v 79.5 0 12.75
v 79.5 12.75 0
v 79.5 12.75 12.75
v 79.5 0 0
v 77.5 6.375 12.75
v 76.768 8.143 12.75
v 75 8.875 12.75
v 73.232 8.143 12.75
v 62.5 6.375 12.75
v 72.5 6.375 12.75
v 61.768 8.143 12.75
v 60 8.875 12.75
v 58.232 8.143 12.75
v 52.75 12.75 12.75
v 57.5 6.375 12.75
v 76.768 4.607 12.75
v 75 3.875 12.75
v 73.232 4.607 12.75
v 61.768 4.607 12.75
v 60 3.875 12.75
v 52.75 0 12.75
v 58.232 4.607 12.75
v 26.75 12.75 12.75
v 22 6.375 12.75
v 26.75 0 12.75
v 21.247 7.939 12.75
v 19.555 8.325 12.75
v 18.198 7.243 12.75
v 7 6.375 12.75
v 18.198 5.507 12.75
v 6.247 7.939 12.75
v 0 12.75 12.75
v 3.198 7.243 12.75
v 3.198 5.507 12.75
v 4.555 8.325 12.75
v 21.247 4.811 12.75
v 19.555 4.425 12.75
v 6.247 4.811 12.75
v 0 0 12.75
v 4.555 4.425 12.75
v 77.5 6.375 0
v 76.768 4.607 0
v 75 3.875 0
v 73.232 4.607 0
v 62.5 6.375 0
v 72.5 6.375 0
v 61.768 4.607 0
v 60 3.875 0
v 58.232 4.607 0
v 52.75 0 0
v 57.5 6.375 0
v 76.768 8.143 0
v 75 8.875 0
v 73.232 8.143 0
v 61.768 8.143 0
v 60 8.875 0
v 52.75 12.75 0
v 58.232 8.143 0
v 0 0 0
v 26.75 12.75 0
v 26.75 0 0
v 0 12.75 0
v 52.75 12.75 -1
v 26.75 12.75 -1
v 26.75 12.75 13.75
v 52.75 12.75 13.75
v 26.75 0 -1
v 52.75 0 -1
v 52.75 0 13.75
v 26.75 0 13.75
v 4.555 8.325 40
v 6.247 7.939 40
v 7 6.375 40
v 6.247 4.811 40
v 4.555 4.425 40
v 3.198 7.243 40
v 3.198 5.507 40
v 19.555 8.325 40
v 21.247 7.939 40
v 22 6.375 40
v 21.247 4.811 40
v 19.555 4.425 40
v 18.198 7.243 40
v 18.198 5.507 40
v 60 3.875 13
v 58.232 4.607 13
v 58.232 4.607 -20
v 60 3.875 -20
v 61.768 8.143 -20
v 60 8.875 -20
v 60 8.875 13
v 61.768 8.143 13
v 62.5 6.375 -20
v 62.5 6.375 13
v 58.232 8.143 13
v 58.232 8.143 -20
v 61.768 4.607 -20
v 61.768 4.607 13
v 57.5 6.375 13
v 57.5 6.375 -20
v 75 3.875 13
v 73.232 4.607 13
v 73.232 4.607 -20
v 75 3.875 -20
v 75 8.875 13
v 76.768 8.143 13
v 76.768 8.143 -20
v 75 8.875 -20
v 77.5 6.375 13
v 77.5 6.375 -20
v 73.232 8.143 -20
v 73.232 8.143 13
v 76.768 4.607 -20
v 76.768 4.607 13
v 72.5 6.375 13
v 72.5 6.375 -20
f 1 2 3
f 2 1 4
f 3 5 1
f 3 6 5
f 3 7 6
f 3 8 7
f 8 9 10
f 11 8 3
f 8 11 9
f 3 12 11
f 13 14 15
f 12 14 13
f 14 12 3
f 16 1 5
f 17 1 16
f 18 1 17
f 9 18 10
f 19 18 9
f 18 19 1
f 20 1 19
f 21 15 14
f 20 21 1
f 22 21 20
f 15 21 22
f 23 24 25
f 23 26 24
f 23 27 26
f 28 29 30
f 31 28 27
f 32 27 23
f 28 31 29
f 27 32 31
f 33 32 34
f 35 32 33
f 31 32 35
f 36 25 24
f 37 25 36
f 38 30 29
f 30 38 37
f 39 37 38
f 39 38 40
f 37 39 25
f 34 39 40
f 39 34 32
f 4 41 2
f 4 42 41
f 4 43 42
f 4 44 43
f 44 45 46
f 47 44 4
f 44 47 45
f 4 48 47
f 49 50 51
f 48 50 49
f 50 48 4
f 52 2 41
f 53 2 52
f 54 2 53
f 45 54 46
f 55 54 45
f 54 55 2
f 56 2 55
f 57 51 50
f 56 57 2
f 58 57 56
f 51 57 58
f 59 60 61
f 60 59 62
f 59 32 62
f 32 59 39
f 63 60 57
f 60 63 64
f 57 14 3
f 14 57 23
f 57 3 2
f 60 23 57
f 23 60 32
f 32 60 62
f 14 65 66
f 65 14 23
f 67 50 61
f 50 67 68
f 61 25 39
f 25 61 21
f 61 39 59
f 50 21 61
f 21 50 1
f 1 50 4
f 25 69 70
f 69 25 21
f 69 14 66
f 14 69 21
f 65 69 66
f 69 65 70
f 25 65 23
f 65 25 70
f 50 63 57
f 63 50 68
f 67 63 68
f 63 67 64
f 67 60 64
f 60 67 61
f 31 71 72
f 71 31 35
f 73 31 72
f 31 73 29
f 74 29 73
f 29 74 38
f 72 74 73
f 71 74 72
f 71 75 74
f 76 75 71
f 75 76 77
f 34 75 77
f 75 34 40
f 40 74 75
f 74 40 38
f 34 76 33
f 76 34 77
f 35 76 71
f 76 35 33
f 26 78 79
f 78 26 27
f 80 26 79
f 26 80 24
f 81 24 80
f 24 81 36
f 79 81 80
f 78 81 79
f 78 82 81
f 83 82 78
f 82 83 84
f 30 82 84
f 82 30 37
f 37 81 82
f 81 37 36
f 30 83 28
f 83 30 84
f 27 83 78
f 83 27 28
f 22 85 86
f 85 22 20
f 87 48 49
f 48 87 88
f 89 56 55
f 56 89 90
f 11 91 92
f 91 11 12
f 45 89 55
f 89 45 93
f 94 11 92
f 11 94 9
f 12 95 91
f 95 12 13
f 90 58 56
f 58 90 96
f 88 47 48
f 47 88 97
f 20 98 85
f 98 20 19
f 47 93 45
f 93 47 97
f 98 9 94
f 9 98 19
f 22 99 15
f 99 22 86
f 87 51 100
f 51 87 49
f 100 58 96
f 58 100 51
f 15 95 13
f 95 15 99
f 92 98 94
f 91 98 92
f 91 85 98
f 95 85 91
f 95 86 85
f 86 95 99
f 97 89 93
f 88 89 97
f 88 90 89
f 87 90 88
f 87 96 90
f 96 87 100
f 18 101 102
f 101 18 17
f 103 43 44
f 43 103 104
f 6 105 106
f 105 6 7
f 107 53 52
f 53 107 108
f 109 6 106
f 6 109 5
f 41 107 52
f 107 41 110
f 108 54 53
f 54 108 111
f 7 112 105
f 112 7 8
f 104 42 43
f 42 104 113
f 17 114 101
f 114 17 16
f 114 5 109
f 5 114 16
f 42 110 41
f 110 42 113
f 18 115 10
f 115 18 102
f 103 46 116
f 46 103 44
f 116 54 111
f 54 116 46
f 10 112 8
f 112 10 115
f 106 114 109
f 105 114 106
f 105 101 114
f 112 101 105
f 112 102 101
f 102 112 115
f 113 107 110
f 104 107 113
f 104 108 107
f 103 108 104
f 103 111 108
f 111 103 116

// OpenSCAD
loadcellHeight = 12.75;
loadcellWidth = 12.75;
loadcellLength = 79.5;

module loadCell() {  
            
    // Bolts holes:
    // M4: 5.0
    // M4: 20.0
    // M5: 60.0
    // M5: 75.0
    // Center go from 26.75 to 52.75
    difference() {
        union() {
            cube([loadcellLength, loadcellWidth, loadcellHeight]);
            
            // strain gauge placement + goo
            translate([(loadcellLength-26)/2,0,loadcellHeight]) {
                cube([26,loadcellWidth,1]);
            }
            translate([(loadcellLength-26)/2,0,-1]) {
                cube([26,loadcellWidth,1]);
            }
            
            // Project bolts up (M4's going up)
            translate([5.0, (12.75/2),0]) {
                // Bigger top connector holes
                // to help align with top when visual testing
                cylinder(d=4, h=40);
            }
            translate([20, (12.75/2),0]) {
                cylinder(d=4, h=40);
            }
            
            // Project bolts down (M5's going down)
            translate([60, (12.75/2),-20]) {
                cylinder(d=5, h=33);
            }
            translate([75, (12.75/2),-20]) {
                cylinder(d=5, h=33);
            }
        }
        union() {
            translate([5.0, (12.75/2),0]) {
                // Bigger top connector holes
                // to help align with top when visual testing
                //#cylinder(d=4, h=40);
            }
            translate([20, (12.75/2),0]) {
                //#cylinder(d=4, h=40);
            }
            //60
            translate([60, (12.75/2),0]) {
                //cylinder(d=4, h=13);
            }
            translate([75, (12.75/2),0]) {
                //cylinder(d=4, h=13);
            }
        }
    }
}

loadCell();
